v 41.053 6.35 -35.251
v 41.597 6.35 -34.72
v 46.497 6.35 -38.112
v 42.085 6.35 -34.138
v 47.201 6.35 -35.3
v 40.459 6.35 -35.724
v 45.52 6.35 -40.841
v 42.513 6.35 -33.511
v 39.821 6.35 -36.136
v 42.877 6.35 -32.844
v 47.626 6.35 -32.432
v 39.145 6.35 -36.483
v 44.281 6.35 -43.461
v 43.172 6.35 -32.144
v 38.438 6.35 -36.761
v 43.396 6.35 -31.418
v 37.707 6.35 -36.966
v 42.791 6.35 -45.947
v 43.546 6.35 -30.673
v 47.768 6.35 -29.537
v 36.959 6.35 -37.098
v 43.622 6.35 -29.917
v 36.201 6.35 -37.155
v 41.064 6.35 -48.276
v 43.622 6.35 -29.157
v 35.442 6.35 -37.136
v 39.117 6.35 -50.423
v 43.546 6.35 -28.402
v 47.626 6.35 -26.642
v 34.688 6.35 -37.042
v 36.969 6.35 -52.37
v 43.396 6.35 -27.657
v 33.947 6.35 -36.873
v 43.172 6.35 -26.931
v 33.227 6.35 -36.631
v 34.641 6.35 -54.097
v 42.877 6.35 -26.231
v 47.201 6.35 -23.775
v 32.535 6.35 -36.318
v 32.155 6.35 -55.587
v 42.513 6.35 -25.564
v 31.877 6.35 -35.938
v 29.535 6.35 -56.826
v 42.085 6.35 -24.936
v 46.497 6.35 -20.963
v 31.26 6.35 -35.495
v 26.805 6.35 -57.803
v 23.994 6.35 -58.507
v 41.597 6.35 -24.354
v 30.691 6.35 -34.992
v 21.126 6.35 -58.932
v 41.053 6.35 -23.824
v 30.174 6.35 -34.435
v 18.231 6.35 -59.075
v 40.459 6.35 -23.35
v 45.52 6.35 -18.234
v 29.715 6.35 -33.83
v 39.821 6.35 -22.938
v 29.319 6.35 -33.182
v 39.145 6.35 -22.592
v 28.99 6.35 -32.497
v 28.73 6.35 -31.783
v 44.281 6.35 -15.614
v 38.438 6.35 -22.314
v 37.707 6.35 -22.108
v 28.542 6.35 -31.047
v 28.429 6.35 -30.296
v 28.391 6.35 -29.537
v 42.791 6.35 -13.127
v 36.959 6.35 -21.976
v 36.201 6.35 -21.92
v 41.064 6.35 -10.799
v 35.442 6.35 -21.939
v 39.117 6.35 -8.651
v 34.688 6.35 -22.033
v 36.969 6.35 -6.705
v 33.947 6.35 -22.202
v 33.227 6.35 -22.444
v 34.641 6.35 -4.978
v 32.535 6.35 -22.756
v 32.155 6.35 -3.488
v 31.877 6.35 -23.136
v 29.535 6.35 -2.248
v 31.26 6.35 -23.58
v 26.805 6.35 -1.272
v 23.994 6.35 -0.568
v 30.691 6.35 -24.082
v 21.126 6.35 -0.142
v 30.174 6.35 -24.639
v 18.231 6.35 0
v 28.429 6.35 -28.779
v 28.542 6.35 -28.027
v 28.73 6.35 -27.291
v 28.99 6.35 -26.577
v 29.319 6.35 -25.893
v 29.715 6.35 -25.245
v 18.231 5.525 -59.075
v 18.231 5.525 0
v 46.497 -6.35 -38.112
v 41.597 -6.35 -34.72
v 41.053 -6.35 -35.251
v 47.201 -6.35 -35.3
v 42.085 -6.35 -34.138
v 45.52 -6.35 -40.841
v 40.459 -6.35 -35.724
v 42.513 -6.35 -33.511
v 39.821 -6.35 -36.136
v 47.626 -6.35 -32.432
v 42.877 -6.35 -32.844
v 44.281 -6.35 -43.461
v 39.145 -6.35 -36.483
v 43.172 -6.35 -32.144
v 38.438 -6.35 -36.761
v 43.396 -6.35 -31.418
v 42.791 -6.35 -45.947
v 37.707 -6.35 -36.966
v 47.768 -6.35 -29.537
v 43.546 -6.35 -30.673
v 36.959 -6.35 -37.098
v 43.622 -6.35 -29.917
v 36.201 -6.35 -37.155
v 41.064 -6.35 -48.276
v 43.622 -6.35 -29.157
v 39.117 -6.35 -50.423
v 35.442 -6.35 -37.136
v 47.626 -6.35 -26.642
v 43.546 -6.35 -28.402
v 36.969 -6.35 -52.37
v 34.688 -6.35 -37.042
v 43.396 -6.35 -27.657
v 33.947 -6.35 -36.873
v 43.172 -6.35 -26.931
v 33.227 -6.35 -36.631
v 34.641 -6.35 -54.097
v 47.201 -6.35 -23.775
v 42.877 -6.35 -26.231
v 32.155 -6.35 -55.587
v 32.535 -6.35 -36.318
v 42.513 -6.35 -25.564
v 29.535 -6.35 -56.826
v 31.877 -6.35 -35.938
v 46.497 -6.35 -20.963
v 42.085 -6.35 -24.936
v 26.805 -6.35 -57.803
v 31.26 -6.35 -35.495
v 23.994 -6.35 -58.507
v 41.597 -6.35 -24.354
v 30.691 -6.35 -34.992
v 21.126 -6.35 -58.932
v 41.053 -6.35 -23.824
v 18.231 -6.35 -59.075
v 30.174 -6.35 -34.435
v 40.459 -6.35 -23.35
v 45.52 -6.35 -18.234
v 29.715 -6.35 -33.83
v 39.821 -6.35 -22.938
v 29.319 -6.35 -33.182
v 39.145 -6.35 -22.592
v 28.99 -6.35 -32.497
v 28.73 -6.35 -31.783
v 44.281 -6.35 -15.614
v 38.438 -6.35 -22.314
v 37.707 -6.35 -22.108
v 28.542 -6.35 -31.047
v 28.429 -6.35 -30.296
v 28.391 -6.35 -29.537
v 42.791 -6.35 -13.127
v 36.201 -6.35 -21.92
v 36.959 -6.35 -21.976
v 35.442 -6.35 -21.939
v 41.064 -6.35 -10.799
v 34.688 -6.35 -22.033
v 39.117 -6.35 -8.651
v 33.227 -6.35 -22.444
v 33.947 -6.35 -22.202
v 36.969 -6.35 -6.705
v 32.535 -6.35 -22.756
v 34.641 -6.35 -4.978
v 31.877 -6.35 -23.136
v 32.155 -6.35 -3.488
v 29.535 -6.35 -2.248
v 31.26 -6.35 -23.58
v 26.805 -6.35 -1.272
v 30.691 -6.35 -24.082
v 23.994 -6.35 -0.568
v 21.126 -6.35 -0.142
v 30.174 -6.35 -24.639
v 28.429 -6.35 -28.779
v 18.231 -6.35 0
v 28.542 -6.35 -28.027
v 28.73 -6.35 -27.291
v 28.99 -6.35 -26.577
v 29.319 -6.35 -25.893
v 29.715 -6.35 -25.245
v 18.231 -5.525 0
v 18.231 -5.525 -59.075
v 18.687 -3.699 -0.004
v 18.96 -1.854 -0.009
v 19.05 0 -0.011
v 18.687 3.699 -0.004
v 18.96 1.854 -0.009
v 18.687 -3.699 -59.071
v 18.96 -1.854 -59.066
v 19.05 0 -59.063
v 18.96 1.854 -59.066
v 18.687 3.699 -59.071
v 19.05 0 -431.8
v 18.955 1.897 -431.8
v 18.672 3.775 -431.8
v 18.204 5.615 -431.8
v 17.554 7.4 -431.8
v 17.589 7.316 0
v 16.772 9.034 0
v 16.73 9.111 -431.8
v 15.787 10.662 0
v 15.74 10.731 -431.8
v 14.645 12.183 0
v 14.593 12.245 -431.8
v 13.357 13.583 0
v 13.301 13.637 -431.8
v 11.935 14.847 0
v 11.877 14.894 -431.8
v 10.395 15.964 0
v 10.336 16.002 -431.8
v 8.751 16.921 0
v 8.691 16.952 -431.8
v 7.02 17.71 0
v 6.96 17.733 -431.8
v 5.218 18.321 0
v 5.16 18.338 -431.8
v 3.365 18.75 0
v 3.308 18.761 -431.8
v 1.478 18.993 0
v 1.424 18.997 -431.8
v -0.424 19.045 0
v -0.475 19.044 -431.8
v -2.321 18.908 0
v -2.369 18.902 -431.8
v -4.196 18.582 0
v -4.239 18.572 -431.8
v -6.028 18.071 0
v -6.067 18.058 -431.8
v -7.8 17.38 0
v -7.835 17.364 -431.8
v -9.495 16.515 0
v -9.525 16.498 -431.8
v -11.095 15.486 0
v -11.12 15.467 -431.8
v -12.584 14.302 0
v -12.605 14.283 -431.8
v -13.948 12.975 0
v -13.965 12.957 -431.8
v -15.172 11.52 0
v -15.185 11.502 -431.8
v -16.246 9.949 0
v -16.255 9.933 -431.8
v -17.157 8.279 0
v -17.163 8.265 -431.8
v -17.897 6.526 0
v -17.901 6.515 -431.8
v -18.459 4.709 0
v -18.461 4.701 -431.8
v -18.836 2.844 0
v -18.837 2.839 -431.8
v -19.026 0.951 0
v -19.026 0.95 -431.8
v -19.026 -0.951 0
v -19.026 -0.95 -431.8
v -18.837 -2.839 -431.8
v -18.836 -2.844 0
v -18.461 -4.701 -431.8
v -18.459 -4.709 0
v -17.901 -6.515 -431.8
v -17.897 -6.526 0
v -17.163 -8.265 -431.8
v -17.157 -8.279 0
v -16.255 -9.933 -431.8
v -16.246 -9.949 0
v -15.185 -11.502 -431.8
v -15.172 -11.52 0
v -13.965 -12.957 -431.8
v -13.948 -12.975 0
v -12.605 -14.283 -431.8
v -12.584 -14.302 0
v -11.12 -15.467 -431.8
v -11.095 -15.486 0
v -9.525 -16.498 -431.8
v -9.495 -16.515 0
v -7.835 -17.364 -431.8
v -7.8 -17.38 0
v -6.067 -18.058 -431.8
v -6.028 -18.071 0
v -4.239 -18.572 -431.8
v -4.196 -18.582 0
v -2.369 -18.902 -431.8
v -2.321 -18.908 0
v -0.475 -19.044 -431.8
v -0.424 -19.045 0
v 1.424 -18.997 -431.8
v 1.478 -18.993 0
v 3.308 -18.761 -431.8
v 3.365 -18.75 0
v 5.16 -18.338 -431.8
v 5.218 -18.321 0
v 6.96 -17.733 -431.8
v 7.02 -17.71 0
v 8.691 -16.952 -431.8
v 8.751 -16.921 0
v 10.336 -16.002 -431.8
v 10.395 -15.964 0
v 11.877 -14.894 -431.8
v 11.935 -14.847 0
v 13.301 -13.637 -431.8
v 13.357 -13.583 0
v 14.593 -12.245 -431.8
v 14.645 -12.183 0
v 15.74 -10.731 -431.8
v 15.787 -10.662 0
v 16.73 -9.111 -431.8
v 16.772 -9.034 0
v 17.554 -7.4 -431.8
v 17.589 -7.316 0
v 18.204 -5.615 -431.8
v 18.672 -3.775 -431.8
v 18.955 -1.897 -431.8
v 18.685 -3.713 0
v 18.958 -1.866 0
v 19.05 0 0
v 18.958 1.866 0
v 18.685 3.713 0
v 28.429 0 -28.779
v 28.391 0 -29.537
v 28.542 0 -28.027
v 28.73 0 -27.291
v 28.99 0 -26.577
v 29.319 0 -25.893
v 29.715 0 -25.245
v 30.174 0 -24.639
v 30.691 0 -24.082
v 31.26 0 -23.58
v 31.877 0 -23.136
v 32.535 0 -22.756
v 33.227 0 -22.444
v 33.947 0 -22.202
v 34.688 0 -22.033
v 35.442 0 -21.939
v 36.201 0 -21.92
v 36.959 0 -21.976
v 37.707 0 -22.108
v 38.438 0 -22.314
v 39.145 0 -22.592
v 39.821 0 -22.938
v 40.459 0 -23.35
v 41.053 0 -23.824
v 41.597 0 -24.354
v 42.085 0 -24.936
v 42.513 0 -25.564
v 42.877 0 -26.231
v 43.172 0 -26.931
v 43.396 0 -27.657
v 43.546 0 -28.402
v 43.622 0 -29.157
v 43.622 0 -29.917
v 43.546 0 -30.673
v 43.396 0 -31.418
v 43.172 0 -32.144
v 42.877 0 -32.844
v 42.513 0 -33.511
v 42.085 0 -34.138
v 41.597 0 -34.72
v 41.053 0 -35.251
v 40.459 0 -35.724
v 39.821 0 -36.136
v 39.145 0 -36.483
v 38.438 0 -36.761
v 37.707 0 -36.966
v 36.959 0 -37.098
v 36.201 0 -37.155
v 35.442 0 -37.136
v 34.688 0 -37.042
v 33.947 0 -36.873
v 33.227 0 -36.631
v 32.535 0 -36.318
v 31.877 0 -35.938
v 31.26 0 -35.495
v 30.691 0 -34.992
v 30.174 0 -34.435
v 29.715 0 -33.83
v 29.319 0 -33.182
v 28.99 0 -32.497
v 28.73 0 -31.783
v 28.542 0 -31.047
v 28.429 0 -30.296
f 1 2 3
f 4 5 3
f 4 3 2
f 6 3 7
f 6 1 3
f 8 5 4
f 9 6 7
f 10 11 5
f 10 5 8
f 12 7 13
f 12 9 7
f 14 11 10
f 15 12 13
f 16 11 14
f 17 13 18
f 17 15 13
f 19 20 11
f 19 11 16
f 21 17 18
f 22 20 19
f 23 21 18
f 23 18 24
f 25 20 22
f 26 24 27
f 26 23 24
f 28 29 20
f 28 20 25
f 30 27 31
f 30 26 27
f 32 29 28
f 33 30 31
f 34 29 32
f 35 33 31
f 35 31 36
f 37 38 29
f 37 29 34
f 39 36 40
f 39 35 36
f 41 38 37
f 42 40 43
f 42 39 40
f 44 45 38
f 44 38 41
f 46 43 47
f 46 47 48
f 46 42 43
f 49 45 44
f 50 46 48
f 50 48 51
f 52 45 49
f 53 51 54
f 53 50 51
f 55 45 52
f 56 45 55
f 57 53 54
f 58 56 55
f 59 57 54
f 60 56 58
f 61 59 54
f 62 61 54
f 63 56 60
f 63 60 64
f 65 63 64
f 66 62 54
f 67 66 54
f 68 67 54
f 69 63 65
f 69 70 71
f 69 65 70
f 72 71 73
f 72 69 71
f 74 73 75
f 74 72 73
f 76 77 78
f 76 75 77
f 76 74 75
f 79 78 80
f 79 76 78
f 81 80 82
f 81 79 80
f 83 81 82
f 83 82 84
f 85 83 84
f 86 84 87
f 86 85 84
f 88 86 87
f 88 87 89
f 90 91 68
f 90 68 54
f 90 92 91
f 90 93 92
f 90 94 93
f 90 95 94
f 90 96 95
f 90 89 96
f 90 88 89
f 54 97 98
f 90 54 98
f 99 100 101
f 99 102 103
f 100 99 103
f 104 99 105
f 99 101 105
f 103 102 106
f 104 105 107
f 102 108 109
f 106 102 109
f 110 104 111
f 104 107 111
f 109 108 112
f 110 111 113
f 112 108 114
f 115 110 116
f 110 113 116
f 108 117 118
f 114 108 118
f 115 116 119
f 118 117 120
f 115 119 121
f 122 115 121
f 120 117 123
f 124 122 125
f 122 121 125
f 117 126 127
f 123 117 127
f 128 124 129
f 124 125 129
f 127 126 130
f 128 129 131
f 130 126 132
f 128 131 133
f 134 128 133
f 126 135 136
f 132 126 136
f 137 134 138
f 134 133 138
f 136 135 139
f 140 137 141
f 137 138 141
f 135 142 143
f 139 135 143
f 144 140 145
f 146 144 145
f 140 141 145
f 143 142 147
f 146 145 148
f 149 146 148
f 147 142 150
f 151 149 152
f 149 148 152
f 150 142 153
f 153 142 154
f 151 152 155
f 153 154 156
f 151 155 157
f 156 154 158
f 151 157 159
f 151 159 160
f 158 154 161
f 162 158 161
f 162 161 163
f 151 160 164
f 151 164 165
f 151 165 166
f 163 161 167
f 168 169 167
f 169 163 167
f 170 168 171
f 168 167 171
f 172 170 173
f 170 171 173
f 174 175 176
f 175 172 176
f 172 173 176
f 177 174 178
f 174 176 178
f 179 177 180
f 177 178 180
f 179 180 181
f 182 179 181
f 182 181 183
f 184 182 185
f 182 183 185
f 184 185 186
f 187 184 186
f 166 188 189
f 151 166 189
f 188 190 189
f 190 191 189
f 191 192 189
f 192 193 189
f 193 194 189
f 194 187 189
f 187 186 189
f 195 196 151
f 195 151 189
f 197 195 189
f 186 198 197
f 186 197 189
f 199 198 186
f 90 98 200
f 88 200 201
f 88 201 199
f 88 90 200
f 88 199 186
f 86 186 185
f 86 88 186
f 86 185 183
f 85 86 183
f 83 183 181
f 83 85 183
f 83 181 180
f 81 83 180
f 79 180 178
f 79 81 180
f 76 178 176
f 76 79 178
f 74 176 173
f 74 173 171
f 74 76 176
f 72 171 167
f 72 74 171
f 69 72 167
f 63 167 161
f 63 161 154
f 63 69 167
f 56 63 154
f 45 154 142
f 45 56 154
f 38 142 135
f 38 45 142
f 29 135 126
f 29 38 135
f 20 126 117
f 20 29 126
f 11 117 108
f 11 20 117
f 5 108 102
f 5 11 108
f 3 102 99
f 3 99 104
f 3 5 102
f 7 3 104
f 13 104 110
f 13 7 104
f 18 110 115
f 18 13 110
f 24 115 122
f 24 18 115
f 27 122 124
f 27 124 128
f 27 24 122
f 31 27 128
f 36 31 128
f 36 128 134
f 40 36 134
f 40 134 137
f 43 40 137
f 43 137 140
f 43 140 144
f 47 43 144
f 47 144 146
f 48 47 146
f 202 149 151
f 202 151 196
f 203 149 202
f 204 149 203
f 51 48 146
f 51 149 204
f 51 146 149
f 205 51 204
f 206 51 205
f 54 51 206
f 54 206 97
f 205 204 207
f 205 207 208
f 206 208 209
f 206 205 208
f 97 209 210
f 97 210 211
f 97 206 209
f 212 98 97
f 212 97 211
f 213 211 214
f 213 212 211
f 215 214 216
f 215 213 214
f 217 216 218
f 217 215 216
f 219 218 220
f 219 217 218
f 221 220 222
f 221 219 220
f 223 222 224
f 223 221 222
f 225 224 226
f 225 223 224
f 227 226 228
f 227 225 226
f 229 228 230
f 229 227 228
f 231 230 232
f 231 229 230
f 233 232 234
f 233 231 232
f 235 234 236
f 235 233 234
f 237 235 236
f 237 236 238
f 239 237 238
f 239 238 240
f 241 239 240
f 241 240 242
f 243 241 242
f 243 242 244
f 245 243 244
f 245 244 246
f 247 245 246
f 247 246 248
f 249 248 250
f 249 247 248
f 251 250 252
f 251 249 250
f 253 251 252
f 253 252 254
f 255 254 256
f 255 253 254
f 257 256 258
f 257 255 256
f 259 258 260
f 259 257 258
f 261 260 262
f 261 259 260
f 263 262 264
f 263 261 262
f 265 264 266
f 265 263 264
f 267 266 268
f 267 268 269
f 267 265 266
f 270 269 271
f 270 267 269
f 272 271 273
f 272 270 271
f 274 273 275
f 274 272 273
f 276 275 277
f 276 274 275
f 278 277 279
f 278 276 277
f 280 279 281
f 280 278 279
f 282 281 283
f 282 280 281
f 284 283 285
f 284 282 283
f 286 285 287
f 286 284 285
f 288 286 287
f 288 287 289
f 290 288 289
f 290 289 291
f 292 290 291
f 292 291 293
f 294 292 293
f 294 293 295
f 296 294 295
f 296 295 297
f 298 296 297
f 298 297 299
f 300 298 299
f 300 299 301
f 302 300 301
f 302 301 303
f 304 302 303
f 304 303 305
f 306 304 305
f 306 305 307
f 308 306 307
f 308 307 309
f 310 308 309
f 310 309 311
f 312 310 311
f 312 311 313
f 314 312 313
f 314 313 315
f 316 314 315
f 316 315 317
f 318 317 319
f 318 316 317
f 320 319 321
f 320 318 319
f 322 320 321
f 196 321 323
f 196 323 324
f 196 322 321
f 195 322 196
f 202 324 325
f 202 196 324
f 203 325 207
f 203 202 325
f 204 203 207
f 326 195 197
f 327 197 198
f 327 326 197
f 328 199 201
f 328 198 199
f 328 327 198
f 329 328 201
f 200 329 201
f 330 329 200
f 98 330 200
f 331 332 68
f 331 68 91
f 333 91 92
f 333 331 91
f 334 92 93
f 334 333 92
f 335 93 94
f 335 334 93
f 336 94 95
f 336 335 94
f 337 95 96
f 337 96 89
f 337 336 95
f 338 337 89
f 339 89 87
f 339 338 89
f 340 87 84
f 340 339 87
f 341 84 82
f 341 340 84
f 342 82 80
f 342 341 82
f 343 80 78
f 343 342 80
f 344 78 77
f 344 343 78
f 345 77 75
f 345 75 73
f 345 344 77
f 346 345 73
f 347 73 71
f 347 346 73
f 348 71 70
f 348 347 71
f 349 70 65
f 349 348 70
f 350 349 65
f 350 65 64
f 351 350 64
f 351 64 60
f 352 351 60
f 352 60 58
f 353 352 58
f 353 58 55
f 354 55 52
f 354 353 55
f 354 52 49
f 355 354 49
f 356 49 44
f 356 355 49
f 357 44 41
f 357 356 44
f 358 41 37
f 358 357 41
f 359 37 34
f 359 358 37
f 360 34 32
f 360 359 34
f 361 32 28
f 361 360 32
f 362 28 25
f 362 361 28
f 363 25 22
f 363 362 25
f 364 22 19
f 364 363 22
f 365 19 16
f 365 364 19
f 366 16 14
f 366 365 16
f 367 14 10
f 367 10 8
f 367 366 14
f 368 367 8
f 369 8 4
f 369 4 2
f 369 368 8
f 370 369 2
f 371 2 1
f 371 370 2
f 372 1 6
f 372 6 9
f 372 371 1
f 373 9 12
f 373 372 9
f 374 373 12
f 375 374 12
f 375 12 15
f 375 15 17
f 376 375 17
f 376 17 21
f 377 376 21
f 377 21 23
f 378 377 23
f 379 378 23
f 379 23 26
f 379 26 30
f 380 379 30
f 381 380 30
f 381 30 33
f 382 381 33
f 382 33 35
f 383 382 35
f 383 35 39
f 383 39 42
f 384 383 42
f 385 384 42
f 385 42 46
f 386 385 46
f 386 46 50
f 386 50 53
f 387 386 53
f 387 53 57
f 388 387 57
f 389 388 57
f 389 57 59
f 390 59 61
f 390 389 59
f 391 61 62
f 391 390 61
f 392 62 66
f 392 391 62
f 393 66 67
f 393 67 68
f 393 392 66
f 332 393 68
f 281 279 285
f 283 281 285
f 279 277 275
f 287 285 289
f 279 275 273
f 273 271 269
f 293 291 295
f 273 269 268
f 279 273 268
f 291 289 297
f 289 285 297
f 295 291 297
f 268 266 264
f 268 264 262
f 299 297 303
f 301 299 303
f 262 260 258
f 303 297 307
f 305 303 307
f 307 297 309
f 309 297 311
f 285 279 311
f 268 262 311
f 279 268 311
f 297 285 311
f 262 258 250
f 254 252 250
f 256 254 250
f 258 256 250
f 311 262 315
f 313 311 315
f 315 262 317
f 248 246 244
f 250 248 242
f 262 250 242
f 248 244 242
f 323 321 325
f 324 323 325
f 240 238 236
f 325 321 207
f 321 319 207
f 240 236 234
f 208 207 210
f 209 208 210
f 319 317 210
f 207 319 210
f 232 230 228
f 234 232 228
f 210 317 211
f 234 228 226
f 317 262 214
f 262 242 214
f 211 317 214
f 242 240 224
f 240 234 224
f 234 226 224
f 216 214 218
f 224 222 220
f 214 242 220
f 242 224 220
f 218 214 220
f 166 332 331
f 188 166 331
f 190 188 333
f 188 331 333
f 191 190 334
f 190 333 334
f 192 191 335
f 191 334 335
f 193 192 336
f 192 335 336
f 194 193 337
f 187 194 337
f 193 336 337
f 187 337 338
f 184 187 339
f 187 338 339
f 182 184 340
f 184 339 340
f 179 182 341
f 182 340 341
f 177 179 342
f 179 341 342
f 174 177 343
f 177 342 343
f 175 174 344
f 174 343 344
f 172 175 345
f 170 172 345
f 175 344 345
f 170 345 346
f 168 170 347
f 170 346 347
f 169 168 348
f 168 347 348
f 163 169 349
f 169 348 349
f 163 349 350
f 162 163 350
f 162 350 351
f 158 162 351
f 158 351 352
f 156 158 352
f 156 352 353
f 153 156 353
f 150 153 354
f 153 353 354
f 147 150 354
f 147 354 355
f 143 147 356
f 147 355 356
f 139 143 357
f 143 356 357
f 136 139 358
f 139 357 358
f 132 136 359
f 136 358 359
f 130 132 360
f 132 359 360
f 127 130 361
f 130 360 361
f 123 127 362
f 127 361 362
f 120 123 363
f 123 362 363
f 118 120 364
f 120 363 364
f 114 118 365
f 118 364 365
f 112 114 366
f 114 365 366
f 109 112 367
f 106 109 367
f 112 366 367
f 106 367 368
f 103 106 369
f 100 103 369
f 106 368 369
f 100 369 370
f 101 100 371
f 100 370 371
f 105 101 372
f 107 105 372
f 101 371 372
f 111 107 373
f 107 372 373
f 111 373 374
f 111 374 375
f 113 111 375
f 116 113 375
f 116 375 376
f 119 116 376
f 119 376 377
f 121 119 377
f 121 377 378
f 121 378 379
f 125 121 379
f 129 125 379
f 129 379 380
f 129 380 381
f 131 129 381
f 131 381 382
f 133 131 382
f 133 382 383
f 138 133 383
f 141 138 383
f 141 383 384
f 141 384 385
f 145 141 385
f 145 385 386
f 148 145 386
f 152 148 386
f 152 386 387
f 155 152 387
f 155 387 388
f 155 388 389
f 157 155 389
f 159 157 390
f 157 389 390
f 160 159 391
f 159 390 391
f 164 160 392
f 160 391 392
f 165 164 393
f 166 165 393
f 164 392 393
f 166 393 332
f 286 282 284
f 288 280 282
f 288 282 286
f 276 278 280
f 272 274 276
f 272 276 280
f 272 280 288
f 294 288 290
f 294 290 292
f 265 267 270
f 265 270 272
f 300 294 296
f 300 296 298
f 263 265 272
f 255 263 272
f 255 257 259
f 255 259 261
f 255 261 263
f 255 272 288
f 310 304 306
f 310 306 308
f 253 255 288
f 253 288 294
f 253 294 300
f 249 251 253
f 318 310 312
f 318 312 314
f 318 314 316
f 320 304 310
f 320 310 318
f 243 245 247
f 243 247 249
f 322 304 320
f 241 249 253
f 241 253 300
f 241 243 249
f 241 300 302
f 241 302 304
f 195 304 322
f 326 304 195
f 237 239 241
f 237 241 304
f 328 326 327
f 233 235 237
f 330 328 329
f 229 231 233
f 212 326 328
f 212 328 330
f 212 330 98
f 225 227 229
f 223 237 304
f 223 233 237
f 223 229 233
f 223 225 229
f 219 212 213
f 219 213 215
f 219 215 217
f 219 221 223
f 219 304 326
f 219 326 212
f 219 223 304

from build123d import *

# Parameters (mm, degrees)
SKETCH1_R                = 19.05
BASE_EXTRUDE_DEPTH       = 431.8
BOSS_EXTRUDE1_DEPTH      = 6.35
BOSS_EXTRUDE1_DEPTH_BACK = 6.35
SKETCH4_R                = 7.62


with BuildPart() as part:
    # Sketch1 → Base-Extrude (new body)
    with BuildSketch(Plane.XY):
        Circle(SKETCH1_R)
    extrude(amount=-BASE_EXTRUDE_DEPTH)

    # Sketch4 → Boss-Extrude1 (add, two sides: drawn at the far end of the back side and taken through both)
    with BuildSketch(Plane(origin=(0, 0, 0), x_dir=(-1, 0, 0), z_dir=(0, 1, 0)).offset(-BOSS_EXTRUDE1_DEPTH_BACK)):
        with BuildLine():
            Line((-18.231166151, -59.074644757), (-18.231166151, 0))
            ThreePointArc((-18.231166151, 0), (-47.768488529, -29.537322378), (-18.231166151, -59.074644757))
        make_face()
        with Locations((-36.011166151, -29.537322378)):
            Circle(SKETCH4_R, mode=Mode.SUBTRACT)
    extrude(amount=BOSS_EXTRUDE1_DEPTH + BOSS_EXTRUDE1_DEPTH_BACK)


solid = part.part
